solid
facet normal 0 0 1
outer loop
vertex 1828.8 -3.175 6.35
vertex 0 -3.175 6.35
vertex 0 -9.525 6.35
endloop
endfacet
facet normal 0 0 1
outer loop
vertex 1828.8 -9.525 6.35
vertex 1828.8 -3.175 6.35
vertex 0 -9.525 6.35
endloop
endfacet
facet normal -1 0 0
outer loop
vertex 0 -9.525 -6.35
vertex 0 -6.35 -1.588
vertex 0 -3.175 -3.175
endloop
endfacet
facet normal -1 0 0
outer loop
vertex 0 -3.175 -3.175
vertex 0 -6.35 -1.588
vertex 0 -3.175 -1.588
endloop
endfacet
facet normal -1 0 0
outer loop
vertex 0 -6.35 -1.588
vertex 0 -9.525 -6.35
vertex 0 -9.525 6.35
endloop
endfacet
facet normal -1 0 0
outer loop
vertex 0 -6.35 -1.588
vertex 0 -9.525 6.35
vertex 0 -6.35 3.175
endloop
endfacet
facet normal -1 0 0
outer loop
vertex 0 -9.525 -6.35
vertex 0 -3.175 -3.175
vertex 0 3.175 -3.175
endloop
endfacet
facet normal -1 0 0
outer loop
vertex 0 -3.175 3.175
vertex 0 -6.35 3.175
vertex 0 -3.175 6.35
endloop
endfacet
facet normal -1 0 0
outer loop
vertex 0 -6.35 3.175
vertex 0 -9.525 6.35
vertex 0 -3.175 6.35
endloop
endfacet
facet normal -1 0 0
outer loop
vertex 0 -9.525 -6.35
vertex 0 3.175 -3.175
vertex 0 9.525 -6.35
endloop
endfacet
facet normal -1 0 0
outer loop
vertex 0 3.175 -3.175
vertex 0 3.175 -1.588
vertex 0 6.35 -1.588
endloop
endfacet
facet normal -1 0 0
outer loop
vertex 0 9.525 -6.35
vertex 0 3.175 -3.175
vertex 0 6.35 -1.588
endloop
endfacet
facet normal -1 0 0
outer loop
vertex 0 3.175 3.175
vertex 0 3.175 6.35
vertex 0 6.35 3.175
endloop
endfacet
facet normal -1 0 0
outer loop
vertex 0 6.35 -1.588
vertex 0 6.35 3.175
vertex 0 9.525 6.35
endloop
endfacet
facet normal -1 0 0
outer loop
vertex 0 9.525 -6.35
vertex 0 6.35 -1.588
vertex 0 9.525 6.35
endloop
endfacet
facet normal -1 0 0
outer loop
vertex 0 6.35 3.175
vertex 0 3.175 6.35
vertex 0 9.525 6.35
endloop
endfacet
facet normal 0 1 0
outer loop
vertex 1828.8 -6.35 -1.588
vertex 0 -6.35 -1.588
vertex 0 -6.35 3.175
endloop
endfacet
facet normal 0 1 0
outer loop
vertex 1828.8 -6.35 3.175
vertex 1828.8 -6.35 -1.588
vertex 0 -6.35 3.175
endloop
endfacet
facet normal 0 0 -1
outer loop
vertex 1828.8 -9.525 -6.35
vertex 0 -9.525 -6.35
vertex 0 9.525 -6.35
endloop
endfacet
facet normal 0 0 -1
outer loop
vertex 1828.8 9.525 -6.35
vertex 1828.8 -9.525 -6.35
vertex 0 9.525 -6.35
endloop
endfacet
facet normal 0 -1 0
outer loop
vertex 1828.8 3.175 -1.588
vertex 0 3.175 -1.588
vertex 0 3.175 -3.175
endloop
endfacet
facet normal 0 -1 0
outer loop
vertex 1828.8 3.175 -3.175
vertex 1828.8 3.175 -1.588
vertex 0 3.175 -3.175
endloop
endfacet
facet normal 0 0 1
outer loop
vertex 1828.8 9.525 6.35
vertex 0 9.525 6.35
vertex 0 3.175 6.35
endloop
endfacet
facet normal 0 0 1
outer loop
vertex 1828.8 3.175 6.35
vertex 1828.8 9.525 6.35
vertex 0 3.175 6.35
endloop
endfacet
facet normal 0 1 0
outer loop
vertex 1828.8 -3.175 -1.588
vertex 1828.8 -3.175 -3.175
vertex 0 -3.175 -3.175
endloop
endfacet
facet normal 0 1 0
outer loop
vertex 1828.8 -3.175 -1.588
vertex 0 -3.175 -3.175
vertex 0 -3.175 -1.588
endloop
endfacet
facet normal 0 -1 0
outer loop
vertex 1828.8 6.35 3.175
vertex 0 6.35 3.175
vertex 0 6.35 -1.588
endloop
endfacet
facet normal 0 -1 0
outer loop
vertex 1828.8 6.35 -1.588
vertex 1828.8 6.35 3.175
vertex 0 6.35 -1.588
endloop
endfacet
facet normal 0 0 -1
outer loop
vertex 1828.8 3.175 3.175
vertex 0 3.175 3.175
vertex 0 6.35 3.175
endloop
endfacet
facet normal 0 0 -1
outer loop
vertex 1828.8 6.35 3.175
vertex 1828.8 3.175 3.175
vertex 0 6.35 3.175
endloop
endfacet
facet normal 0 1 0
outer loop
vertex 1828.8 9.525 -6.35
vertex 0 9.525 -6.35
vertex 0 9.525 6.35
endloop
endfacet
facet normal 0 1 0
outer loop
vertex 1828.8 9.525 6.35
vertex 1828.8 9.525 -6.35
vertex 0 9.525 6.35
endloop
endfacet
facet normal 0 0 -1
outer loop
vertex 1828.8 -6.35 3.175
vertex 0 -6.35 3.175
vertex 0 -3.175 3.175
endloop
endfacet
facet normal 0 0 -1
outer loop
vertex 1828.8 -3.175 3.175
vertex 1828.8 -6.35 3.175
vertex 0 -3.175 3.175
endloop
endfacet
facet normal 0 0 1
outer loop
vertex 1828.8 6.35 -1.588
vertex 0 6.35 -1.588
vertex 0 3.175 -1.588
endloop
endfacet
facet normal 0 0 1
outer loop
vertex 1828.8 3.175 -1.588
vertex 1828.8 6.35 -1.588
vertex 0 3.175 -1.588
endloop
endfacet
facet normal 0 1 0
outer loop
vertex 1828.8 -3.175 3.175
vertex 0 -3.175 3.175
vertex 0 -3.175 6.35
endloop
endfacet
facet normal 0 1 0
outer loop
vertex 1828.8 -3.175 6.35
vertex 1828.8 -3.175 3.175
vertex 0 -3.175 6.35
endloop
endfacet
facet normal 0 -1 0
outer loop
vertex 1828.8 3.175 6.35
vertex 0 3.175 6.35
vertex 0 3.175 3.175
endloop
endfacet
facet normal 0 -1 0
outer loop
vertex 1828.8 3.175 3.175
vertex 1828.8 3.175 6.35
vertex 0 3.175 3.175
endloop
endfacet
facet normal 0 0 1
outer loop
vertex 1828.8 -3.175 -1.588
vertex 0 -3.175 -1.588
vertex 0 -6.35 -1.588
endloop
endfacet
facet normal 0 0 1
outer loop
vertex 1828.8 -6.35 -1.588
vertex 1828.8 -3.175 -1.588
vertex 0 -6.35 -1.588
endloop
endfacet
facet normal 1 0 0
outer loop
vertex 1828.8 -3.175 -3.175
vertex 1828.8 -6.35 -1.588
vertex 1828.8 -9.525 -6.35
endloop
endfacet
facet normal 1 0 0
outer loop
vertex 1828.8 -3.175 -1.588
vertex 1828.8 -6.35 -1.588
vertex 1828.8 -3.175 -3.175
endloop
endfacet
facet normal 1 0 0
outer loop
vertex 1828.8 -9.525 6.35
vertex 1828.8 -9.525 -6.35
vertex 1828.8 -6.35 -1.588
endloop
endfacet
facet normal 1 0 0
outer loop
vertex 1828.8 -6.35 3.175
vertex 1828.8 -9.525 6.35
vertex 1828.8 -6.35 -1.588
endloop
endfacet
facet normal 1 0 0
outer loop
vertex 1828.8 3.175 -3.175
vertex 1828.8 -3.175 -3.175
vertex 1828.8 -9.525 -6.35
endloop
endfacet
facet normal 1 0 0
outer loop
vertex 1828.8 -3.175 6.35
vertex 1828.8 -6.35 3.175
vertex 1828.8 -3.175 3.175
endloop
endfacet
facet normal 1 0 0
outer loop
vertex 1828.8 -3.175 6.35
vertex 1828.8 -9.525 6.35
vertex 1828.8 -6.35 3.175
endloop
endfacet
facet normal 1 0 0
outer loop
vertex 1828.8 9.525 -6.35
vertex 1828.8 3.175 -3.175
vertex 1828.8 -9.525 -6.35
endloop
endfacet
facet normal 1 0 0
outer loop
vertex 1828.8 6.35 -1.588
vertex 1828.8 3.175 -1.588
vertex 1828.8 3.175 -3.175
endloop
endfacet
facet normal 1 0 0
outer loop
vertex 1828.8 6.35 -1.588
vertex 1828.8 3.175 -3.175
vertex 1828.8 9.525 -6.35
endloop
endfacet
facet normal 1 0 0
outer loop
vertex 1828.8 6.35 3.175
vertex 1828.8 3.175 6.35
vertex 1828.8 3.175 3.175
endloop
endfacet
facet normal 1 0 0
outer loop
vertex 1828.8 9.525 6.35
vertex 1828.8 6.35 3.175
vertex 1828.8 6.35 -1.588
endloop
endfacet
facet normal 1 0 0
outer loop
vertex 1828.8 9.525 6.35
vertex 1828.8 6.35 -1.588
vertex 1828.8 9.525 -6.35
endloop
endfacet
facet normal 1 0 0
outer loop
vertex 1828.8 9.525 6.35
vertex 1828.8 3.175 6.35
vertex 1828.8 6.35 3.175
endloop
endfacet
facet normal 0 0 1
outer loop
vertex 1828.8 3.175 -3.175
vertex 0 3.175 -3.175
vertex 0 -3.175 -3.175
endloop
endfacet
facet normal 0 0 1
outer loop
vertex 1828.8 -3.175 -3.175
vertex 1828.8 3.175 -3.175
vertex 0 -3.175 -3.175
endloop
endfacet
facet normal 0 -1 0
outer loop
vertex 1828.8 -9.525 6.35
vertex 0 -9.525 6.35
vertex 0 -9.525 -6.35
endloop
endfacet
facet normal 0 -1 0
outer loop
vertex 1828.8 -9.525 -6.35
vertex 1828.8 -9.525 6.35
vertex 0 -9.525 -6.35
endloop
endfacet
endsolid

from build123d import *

# Parameters (mm, degrees)
F1_DEPTH = 1828.8


with BuildPart() as f1:
    # F0 (on Right) → F1 (new body)
    with BuildSketch(Plane.YZ):
        Polygon((-9.525, 6.35), (-9.525, -6.35), (9.525, -6.35), (9.525, 6.35), (3.175, 6.35), (3.175, 3.175), (6.35, 3.175), (6.35, -1.5875), (3.175, -1.5875), (3.175, -3.175), (-3.175, -3.175), (-3.175, -1.5875), (-6.35, -1.5875), (-6.35, 3.175), (-3.175, 3.175), (-3.175, 6.35), align=None)
    extrude(amount=F1_DEPTH)


solid = f1.part
